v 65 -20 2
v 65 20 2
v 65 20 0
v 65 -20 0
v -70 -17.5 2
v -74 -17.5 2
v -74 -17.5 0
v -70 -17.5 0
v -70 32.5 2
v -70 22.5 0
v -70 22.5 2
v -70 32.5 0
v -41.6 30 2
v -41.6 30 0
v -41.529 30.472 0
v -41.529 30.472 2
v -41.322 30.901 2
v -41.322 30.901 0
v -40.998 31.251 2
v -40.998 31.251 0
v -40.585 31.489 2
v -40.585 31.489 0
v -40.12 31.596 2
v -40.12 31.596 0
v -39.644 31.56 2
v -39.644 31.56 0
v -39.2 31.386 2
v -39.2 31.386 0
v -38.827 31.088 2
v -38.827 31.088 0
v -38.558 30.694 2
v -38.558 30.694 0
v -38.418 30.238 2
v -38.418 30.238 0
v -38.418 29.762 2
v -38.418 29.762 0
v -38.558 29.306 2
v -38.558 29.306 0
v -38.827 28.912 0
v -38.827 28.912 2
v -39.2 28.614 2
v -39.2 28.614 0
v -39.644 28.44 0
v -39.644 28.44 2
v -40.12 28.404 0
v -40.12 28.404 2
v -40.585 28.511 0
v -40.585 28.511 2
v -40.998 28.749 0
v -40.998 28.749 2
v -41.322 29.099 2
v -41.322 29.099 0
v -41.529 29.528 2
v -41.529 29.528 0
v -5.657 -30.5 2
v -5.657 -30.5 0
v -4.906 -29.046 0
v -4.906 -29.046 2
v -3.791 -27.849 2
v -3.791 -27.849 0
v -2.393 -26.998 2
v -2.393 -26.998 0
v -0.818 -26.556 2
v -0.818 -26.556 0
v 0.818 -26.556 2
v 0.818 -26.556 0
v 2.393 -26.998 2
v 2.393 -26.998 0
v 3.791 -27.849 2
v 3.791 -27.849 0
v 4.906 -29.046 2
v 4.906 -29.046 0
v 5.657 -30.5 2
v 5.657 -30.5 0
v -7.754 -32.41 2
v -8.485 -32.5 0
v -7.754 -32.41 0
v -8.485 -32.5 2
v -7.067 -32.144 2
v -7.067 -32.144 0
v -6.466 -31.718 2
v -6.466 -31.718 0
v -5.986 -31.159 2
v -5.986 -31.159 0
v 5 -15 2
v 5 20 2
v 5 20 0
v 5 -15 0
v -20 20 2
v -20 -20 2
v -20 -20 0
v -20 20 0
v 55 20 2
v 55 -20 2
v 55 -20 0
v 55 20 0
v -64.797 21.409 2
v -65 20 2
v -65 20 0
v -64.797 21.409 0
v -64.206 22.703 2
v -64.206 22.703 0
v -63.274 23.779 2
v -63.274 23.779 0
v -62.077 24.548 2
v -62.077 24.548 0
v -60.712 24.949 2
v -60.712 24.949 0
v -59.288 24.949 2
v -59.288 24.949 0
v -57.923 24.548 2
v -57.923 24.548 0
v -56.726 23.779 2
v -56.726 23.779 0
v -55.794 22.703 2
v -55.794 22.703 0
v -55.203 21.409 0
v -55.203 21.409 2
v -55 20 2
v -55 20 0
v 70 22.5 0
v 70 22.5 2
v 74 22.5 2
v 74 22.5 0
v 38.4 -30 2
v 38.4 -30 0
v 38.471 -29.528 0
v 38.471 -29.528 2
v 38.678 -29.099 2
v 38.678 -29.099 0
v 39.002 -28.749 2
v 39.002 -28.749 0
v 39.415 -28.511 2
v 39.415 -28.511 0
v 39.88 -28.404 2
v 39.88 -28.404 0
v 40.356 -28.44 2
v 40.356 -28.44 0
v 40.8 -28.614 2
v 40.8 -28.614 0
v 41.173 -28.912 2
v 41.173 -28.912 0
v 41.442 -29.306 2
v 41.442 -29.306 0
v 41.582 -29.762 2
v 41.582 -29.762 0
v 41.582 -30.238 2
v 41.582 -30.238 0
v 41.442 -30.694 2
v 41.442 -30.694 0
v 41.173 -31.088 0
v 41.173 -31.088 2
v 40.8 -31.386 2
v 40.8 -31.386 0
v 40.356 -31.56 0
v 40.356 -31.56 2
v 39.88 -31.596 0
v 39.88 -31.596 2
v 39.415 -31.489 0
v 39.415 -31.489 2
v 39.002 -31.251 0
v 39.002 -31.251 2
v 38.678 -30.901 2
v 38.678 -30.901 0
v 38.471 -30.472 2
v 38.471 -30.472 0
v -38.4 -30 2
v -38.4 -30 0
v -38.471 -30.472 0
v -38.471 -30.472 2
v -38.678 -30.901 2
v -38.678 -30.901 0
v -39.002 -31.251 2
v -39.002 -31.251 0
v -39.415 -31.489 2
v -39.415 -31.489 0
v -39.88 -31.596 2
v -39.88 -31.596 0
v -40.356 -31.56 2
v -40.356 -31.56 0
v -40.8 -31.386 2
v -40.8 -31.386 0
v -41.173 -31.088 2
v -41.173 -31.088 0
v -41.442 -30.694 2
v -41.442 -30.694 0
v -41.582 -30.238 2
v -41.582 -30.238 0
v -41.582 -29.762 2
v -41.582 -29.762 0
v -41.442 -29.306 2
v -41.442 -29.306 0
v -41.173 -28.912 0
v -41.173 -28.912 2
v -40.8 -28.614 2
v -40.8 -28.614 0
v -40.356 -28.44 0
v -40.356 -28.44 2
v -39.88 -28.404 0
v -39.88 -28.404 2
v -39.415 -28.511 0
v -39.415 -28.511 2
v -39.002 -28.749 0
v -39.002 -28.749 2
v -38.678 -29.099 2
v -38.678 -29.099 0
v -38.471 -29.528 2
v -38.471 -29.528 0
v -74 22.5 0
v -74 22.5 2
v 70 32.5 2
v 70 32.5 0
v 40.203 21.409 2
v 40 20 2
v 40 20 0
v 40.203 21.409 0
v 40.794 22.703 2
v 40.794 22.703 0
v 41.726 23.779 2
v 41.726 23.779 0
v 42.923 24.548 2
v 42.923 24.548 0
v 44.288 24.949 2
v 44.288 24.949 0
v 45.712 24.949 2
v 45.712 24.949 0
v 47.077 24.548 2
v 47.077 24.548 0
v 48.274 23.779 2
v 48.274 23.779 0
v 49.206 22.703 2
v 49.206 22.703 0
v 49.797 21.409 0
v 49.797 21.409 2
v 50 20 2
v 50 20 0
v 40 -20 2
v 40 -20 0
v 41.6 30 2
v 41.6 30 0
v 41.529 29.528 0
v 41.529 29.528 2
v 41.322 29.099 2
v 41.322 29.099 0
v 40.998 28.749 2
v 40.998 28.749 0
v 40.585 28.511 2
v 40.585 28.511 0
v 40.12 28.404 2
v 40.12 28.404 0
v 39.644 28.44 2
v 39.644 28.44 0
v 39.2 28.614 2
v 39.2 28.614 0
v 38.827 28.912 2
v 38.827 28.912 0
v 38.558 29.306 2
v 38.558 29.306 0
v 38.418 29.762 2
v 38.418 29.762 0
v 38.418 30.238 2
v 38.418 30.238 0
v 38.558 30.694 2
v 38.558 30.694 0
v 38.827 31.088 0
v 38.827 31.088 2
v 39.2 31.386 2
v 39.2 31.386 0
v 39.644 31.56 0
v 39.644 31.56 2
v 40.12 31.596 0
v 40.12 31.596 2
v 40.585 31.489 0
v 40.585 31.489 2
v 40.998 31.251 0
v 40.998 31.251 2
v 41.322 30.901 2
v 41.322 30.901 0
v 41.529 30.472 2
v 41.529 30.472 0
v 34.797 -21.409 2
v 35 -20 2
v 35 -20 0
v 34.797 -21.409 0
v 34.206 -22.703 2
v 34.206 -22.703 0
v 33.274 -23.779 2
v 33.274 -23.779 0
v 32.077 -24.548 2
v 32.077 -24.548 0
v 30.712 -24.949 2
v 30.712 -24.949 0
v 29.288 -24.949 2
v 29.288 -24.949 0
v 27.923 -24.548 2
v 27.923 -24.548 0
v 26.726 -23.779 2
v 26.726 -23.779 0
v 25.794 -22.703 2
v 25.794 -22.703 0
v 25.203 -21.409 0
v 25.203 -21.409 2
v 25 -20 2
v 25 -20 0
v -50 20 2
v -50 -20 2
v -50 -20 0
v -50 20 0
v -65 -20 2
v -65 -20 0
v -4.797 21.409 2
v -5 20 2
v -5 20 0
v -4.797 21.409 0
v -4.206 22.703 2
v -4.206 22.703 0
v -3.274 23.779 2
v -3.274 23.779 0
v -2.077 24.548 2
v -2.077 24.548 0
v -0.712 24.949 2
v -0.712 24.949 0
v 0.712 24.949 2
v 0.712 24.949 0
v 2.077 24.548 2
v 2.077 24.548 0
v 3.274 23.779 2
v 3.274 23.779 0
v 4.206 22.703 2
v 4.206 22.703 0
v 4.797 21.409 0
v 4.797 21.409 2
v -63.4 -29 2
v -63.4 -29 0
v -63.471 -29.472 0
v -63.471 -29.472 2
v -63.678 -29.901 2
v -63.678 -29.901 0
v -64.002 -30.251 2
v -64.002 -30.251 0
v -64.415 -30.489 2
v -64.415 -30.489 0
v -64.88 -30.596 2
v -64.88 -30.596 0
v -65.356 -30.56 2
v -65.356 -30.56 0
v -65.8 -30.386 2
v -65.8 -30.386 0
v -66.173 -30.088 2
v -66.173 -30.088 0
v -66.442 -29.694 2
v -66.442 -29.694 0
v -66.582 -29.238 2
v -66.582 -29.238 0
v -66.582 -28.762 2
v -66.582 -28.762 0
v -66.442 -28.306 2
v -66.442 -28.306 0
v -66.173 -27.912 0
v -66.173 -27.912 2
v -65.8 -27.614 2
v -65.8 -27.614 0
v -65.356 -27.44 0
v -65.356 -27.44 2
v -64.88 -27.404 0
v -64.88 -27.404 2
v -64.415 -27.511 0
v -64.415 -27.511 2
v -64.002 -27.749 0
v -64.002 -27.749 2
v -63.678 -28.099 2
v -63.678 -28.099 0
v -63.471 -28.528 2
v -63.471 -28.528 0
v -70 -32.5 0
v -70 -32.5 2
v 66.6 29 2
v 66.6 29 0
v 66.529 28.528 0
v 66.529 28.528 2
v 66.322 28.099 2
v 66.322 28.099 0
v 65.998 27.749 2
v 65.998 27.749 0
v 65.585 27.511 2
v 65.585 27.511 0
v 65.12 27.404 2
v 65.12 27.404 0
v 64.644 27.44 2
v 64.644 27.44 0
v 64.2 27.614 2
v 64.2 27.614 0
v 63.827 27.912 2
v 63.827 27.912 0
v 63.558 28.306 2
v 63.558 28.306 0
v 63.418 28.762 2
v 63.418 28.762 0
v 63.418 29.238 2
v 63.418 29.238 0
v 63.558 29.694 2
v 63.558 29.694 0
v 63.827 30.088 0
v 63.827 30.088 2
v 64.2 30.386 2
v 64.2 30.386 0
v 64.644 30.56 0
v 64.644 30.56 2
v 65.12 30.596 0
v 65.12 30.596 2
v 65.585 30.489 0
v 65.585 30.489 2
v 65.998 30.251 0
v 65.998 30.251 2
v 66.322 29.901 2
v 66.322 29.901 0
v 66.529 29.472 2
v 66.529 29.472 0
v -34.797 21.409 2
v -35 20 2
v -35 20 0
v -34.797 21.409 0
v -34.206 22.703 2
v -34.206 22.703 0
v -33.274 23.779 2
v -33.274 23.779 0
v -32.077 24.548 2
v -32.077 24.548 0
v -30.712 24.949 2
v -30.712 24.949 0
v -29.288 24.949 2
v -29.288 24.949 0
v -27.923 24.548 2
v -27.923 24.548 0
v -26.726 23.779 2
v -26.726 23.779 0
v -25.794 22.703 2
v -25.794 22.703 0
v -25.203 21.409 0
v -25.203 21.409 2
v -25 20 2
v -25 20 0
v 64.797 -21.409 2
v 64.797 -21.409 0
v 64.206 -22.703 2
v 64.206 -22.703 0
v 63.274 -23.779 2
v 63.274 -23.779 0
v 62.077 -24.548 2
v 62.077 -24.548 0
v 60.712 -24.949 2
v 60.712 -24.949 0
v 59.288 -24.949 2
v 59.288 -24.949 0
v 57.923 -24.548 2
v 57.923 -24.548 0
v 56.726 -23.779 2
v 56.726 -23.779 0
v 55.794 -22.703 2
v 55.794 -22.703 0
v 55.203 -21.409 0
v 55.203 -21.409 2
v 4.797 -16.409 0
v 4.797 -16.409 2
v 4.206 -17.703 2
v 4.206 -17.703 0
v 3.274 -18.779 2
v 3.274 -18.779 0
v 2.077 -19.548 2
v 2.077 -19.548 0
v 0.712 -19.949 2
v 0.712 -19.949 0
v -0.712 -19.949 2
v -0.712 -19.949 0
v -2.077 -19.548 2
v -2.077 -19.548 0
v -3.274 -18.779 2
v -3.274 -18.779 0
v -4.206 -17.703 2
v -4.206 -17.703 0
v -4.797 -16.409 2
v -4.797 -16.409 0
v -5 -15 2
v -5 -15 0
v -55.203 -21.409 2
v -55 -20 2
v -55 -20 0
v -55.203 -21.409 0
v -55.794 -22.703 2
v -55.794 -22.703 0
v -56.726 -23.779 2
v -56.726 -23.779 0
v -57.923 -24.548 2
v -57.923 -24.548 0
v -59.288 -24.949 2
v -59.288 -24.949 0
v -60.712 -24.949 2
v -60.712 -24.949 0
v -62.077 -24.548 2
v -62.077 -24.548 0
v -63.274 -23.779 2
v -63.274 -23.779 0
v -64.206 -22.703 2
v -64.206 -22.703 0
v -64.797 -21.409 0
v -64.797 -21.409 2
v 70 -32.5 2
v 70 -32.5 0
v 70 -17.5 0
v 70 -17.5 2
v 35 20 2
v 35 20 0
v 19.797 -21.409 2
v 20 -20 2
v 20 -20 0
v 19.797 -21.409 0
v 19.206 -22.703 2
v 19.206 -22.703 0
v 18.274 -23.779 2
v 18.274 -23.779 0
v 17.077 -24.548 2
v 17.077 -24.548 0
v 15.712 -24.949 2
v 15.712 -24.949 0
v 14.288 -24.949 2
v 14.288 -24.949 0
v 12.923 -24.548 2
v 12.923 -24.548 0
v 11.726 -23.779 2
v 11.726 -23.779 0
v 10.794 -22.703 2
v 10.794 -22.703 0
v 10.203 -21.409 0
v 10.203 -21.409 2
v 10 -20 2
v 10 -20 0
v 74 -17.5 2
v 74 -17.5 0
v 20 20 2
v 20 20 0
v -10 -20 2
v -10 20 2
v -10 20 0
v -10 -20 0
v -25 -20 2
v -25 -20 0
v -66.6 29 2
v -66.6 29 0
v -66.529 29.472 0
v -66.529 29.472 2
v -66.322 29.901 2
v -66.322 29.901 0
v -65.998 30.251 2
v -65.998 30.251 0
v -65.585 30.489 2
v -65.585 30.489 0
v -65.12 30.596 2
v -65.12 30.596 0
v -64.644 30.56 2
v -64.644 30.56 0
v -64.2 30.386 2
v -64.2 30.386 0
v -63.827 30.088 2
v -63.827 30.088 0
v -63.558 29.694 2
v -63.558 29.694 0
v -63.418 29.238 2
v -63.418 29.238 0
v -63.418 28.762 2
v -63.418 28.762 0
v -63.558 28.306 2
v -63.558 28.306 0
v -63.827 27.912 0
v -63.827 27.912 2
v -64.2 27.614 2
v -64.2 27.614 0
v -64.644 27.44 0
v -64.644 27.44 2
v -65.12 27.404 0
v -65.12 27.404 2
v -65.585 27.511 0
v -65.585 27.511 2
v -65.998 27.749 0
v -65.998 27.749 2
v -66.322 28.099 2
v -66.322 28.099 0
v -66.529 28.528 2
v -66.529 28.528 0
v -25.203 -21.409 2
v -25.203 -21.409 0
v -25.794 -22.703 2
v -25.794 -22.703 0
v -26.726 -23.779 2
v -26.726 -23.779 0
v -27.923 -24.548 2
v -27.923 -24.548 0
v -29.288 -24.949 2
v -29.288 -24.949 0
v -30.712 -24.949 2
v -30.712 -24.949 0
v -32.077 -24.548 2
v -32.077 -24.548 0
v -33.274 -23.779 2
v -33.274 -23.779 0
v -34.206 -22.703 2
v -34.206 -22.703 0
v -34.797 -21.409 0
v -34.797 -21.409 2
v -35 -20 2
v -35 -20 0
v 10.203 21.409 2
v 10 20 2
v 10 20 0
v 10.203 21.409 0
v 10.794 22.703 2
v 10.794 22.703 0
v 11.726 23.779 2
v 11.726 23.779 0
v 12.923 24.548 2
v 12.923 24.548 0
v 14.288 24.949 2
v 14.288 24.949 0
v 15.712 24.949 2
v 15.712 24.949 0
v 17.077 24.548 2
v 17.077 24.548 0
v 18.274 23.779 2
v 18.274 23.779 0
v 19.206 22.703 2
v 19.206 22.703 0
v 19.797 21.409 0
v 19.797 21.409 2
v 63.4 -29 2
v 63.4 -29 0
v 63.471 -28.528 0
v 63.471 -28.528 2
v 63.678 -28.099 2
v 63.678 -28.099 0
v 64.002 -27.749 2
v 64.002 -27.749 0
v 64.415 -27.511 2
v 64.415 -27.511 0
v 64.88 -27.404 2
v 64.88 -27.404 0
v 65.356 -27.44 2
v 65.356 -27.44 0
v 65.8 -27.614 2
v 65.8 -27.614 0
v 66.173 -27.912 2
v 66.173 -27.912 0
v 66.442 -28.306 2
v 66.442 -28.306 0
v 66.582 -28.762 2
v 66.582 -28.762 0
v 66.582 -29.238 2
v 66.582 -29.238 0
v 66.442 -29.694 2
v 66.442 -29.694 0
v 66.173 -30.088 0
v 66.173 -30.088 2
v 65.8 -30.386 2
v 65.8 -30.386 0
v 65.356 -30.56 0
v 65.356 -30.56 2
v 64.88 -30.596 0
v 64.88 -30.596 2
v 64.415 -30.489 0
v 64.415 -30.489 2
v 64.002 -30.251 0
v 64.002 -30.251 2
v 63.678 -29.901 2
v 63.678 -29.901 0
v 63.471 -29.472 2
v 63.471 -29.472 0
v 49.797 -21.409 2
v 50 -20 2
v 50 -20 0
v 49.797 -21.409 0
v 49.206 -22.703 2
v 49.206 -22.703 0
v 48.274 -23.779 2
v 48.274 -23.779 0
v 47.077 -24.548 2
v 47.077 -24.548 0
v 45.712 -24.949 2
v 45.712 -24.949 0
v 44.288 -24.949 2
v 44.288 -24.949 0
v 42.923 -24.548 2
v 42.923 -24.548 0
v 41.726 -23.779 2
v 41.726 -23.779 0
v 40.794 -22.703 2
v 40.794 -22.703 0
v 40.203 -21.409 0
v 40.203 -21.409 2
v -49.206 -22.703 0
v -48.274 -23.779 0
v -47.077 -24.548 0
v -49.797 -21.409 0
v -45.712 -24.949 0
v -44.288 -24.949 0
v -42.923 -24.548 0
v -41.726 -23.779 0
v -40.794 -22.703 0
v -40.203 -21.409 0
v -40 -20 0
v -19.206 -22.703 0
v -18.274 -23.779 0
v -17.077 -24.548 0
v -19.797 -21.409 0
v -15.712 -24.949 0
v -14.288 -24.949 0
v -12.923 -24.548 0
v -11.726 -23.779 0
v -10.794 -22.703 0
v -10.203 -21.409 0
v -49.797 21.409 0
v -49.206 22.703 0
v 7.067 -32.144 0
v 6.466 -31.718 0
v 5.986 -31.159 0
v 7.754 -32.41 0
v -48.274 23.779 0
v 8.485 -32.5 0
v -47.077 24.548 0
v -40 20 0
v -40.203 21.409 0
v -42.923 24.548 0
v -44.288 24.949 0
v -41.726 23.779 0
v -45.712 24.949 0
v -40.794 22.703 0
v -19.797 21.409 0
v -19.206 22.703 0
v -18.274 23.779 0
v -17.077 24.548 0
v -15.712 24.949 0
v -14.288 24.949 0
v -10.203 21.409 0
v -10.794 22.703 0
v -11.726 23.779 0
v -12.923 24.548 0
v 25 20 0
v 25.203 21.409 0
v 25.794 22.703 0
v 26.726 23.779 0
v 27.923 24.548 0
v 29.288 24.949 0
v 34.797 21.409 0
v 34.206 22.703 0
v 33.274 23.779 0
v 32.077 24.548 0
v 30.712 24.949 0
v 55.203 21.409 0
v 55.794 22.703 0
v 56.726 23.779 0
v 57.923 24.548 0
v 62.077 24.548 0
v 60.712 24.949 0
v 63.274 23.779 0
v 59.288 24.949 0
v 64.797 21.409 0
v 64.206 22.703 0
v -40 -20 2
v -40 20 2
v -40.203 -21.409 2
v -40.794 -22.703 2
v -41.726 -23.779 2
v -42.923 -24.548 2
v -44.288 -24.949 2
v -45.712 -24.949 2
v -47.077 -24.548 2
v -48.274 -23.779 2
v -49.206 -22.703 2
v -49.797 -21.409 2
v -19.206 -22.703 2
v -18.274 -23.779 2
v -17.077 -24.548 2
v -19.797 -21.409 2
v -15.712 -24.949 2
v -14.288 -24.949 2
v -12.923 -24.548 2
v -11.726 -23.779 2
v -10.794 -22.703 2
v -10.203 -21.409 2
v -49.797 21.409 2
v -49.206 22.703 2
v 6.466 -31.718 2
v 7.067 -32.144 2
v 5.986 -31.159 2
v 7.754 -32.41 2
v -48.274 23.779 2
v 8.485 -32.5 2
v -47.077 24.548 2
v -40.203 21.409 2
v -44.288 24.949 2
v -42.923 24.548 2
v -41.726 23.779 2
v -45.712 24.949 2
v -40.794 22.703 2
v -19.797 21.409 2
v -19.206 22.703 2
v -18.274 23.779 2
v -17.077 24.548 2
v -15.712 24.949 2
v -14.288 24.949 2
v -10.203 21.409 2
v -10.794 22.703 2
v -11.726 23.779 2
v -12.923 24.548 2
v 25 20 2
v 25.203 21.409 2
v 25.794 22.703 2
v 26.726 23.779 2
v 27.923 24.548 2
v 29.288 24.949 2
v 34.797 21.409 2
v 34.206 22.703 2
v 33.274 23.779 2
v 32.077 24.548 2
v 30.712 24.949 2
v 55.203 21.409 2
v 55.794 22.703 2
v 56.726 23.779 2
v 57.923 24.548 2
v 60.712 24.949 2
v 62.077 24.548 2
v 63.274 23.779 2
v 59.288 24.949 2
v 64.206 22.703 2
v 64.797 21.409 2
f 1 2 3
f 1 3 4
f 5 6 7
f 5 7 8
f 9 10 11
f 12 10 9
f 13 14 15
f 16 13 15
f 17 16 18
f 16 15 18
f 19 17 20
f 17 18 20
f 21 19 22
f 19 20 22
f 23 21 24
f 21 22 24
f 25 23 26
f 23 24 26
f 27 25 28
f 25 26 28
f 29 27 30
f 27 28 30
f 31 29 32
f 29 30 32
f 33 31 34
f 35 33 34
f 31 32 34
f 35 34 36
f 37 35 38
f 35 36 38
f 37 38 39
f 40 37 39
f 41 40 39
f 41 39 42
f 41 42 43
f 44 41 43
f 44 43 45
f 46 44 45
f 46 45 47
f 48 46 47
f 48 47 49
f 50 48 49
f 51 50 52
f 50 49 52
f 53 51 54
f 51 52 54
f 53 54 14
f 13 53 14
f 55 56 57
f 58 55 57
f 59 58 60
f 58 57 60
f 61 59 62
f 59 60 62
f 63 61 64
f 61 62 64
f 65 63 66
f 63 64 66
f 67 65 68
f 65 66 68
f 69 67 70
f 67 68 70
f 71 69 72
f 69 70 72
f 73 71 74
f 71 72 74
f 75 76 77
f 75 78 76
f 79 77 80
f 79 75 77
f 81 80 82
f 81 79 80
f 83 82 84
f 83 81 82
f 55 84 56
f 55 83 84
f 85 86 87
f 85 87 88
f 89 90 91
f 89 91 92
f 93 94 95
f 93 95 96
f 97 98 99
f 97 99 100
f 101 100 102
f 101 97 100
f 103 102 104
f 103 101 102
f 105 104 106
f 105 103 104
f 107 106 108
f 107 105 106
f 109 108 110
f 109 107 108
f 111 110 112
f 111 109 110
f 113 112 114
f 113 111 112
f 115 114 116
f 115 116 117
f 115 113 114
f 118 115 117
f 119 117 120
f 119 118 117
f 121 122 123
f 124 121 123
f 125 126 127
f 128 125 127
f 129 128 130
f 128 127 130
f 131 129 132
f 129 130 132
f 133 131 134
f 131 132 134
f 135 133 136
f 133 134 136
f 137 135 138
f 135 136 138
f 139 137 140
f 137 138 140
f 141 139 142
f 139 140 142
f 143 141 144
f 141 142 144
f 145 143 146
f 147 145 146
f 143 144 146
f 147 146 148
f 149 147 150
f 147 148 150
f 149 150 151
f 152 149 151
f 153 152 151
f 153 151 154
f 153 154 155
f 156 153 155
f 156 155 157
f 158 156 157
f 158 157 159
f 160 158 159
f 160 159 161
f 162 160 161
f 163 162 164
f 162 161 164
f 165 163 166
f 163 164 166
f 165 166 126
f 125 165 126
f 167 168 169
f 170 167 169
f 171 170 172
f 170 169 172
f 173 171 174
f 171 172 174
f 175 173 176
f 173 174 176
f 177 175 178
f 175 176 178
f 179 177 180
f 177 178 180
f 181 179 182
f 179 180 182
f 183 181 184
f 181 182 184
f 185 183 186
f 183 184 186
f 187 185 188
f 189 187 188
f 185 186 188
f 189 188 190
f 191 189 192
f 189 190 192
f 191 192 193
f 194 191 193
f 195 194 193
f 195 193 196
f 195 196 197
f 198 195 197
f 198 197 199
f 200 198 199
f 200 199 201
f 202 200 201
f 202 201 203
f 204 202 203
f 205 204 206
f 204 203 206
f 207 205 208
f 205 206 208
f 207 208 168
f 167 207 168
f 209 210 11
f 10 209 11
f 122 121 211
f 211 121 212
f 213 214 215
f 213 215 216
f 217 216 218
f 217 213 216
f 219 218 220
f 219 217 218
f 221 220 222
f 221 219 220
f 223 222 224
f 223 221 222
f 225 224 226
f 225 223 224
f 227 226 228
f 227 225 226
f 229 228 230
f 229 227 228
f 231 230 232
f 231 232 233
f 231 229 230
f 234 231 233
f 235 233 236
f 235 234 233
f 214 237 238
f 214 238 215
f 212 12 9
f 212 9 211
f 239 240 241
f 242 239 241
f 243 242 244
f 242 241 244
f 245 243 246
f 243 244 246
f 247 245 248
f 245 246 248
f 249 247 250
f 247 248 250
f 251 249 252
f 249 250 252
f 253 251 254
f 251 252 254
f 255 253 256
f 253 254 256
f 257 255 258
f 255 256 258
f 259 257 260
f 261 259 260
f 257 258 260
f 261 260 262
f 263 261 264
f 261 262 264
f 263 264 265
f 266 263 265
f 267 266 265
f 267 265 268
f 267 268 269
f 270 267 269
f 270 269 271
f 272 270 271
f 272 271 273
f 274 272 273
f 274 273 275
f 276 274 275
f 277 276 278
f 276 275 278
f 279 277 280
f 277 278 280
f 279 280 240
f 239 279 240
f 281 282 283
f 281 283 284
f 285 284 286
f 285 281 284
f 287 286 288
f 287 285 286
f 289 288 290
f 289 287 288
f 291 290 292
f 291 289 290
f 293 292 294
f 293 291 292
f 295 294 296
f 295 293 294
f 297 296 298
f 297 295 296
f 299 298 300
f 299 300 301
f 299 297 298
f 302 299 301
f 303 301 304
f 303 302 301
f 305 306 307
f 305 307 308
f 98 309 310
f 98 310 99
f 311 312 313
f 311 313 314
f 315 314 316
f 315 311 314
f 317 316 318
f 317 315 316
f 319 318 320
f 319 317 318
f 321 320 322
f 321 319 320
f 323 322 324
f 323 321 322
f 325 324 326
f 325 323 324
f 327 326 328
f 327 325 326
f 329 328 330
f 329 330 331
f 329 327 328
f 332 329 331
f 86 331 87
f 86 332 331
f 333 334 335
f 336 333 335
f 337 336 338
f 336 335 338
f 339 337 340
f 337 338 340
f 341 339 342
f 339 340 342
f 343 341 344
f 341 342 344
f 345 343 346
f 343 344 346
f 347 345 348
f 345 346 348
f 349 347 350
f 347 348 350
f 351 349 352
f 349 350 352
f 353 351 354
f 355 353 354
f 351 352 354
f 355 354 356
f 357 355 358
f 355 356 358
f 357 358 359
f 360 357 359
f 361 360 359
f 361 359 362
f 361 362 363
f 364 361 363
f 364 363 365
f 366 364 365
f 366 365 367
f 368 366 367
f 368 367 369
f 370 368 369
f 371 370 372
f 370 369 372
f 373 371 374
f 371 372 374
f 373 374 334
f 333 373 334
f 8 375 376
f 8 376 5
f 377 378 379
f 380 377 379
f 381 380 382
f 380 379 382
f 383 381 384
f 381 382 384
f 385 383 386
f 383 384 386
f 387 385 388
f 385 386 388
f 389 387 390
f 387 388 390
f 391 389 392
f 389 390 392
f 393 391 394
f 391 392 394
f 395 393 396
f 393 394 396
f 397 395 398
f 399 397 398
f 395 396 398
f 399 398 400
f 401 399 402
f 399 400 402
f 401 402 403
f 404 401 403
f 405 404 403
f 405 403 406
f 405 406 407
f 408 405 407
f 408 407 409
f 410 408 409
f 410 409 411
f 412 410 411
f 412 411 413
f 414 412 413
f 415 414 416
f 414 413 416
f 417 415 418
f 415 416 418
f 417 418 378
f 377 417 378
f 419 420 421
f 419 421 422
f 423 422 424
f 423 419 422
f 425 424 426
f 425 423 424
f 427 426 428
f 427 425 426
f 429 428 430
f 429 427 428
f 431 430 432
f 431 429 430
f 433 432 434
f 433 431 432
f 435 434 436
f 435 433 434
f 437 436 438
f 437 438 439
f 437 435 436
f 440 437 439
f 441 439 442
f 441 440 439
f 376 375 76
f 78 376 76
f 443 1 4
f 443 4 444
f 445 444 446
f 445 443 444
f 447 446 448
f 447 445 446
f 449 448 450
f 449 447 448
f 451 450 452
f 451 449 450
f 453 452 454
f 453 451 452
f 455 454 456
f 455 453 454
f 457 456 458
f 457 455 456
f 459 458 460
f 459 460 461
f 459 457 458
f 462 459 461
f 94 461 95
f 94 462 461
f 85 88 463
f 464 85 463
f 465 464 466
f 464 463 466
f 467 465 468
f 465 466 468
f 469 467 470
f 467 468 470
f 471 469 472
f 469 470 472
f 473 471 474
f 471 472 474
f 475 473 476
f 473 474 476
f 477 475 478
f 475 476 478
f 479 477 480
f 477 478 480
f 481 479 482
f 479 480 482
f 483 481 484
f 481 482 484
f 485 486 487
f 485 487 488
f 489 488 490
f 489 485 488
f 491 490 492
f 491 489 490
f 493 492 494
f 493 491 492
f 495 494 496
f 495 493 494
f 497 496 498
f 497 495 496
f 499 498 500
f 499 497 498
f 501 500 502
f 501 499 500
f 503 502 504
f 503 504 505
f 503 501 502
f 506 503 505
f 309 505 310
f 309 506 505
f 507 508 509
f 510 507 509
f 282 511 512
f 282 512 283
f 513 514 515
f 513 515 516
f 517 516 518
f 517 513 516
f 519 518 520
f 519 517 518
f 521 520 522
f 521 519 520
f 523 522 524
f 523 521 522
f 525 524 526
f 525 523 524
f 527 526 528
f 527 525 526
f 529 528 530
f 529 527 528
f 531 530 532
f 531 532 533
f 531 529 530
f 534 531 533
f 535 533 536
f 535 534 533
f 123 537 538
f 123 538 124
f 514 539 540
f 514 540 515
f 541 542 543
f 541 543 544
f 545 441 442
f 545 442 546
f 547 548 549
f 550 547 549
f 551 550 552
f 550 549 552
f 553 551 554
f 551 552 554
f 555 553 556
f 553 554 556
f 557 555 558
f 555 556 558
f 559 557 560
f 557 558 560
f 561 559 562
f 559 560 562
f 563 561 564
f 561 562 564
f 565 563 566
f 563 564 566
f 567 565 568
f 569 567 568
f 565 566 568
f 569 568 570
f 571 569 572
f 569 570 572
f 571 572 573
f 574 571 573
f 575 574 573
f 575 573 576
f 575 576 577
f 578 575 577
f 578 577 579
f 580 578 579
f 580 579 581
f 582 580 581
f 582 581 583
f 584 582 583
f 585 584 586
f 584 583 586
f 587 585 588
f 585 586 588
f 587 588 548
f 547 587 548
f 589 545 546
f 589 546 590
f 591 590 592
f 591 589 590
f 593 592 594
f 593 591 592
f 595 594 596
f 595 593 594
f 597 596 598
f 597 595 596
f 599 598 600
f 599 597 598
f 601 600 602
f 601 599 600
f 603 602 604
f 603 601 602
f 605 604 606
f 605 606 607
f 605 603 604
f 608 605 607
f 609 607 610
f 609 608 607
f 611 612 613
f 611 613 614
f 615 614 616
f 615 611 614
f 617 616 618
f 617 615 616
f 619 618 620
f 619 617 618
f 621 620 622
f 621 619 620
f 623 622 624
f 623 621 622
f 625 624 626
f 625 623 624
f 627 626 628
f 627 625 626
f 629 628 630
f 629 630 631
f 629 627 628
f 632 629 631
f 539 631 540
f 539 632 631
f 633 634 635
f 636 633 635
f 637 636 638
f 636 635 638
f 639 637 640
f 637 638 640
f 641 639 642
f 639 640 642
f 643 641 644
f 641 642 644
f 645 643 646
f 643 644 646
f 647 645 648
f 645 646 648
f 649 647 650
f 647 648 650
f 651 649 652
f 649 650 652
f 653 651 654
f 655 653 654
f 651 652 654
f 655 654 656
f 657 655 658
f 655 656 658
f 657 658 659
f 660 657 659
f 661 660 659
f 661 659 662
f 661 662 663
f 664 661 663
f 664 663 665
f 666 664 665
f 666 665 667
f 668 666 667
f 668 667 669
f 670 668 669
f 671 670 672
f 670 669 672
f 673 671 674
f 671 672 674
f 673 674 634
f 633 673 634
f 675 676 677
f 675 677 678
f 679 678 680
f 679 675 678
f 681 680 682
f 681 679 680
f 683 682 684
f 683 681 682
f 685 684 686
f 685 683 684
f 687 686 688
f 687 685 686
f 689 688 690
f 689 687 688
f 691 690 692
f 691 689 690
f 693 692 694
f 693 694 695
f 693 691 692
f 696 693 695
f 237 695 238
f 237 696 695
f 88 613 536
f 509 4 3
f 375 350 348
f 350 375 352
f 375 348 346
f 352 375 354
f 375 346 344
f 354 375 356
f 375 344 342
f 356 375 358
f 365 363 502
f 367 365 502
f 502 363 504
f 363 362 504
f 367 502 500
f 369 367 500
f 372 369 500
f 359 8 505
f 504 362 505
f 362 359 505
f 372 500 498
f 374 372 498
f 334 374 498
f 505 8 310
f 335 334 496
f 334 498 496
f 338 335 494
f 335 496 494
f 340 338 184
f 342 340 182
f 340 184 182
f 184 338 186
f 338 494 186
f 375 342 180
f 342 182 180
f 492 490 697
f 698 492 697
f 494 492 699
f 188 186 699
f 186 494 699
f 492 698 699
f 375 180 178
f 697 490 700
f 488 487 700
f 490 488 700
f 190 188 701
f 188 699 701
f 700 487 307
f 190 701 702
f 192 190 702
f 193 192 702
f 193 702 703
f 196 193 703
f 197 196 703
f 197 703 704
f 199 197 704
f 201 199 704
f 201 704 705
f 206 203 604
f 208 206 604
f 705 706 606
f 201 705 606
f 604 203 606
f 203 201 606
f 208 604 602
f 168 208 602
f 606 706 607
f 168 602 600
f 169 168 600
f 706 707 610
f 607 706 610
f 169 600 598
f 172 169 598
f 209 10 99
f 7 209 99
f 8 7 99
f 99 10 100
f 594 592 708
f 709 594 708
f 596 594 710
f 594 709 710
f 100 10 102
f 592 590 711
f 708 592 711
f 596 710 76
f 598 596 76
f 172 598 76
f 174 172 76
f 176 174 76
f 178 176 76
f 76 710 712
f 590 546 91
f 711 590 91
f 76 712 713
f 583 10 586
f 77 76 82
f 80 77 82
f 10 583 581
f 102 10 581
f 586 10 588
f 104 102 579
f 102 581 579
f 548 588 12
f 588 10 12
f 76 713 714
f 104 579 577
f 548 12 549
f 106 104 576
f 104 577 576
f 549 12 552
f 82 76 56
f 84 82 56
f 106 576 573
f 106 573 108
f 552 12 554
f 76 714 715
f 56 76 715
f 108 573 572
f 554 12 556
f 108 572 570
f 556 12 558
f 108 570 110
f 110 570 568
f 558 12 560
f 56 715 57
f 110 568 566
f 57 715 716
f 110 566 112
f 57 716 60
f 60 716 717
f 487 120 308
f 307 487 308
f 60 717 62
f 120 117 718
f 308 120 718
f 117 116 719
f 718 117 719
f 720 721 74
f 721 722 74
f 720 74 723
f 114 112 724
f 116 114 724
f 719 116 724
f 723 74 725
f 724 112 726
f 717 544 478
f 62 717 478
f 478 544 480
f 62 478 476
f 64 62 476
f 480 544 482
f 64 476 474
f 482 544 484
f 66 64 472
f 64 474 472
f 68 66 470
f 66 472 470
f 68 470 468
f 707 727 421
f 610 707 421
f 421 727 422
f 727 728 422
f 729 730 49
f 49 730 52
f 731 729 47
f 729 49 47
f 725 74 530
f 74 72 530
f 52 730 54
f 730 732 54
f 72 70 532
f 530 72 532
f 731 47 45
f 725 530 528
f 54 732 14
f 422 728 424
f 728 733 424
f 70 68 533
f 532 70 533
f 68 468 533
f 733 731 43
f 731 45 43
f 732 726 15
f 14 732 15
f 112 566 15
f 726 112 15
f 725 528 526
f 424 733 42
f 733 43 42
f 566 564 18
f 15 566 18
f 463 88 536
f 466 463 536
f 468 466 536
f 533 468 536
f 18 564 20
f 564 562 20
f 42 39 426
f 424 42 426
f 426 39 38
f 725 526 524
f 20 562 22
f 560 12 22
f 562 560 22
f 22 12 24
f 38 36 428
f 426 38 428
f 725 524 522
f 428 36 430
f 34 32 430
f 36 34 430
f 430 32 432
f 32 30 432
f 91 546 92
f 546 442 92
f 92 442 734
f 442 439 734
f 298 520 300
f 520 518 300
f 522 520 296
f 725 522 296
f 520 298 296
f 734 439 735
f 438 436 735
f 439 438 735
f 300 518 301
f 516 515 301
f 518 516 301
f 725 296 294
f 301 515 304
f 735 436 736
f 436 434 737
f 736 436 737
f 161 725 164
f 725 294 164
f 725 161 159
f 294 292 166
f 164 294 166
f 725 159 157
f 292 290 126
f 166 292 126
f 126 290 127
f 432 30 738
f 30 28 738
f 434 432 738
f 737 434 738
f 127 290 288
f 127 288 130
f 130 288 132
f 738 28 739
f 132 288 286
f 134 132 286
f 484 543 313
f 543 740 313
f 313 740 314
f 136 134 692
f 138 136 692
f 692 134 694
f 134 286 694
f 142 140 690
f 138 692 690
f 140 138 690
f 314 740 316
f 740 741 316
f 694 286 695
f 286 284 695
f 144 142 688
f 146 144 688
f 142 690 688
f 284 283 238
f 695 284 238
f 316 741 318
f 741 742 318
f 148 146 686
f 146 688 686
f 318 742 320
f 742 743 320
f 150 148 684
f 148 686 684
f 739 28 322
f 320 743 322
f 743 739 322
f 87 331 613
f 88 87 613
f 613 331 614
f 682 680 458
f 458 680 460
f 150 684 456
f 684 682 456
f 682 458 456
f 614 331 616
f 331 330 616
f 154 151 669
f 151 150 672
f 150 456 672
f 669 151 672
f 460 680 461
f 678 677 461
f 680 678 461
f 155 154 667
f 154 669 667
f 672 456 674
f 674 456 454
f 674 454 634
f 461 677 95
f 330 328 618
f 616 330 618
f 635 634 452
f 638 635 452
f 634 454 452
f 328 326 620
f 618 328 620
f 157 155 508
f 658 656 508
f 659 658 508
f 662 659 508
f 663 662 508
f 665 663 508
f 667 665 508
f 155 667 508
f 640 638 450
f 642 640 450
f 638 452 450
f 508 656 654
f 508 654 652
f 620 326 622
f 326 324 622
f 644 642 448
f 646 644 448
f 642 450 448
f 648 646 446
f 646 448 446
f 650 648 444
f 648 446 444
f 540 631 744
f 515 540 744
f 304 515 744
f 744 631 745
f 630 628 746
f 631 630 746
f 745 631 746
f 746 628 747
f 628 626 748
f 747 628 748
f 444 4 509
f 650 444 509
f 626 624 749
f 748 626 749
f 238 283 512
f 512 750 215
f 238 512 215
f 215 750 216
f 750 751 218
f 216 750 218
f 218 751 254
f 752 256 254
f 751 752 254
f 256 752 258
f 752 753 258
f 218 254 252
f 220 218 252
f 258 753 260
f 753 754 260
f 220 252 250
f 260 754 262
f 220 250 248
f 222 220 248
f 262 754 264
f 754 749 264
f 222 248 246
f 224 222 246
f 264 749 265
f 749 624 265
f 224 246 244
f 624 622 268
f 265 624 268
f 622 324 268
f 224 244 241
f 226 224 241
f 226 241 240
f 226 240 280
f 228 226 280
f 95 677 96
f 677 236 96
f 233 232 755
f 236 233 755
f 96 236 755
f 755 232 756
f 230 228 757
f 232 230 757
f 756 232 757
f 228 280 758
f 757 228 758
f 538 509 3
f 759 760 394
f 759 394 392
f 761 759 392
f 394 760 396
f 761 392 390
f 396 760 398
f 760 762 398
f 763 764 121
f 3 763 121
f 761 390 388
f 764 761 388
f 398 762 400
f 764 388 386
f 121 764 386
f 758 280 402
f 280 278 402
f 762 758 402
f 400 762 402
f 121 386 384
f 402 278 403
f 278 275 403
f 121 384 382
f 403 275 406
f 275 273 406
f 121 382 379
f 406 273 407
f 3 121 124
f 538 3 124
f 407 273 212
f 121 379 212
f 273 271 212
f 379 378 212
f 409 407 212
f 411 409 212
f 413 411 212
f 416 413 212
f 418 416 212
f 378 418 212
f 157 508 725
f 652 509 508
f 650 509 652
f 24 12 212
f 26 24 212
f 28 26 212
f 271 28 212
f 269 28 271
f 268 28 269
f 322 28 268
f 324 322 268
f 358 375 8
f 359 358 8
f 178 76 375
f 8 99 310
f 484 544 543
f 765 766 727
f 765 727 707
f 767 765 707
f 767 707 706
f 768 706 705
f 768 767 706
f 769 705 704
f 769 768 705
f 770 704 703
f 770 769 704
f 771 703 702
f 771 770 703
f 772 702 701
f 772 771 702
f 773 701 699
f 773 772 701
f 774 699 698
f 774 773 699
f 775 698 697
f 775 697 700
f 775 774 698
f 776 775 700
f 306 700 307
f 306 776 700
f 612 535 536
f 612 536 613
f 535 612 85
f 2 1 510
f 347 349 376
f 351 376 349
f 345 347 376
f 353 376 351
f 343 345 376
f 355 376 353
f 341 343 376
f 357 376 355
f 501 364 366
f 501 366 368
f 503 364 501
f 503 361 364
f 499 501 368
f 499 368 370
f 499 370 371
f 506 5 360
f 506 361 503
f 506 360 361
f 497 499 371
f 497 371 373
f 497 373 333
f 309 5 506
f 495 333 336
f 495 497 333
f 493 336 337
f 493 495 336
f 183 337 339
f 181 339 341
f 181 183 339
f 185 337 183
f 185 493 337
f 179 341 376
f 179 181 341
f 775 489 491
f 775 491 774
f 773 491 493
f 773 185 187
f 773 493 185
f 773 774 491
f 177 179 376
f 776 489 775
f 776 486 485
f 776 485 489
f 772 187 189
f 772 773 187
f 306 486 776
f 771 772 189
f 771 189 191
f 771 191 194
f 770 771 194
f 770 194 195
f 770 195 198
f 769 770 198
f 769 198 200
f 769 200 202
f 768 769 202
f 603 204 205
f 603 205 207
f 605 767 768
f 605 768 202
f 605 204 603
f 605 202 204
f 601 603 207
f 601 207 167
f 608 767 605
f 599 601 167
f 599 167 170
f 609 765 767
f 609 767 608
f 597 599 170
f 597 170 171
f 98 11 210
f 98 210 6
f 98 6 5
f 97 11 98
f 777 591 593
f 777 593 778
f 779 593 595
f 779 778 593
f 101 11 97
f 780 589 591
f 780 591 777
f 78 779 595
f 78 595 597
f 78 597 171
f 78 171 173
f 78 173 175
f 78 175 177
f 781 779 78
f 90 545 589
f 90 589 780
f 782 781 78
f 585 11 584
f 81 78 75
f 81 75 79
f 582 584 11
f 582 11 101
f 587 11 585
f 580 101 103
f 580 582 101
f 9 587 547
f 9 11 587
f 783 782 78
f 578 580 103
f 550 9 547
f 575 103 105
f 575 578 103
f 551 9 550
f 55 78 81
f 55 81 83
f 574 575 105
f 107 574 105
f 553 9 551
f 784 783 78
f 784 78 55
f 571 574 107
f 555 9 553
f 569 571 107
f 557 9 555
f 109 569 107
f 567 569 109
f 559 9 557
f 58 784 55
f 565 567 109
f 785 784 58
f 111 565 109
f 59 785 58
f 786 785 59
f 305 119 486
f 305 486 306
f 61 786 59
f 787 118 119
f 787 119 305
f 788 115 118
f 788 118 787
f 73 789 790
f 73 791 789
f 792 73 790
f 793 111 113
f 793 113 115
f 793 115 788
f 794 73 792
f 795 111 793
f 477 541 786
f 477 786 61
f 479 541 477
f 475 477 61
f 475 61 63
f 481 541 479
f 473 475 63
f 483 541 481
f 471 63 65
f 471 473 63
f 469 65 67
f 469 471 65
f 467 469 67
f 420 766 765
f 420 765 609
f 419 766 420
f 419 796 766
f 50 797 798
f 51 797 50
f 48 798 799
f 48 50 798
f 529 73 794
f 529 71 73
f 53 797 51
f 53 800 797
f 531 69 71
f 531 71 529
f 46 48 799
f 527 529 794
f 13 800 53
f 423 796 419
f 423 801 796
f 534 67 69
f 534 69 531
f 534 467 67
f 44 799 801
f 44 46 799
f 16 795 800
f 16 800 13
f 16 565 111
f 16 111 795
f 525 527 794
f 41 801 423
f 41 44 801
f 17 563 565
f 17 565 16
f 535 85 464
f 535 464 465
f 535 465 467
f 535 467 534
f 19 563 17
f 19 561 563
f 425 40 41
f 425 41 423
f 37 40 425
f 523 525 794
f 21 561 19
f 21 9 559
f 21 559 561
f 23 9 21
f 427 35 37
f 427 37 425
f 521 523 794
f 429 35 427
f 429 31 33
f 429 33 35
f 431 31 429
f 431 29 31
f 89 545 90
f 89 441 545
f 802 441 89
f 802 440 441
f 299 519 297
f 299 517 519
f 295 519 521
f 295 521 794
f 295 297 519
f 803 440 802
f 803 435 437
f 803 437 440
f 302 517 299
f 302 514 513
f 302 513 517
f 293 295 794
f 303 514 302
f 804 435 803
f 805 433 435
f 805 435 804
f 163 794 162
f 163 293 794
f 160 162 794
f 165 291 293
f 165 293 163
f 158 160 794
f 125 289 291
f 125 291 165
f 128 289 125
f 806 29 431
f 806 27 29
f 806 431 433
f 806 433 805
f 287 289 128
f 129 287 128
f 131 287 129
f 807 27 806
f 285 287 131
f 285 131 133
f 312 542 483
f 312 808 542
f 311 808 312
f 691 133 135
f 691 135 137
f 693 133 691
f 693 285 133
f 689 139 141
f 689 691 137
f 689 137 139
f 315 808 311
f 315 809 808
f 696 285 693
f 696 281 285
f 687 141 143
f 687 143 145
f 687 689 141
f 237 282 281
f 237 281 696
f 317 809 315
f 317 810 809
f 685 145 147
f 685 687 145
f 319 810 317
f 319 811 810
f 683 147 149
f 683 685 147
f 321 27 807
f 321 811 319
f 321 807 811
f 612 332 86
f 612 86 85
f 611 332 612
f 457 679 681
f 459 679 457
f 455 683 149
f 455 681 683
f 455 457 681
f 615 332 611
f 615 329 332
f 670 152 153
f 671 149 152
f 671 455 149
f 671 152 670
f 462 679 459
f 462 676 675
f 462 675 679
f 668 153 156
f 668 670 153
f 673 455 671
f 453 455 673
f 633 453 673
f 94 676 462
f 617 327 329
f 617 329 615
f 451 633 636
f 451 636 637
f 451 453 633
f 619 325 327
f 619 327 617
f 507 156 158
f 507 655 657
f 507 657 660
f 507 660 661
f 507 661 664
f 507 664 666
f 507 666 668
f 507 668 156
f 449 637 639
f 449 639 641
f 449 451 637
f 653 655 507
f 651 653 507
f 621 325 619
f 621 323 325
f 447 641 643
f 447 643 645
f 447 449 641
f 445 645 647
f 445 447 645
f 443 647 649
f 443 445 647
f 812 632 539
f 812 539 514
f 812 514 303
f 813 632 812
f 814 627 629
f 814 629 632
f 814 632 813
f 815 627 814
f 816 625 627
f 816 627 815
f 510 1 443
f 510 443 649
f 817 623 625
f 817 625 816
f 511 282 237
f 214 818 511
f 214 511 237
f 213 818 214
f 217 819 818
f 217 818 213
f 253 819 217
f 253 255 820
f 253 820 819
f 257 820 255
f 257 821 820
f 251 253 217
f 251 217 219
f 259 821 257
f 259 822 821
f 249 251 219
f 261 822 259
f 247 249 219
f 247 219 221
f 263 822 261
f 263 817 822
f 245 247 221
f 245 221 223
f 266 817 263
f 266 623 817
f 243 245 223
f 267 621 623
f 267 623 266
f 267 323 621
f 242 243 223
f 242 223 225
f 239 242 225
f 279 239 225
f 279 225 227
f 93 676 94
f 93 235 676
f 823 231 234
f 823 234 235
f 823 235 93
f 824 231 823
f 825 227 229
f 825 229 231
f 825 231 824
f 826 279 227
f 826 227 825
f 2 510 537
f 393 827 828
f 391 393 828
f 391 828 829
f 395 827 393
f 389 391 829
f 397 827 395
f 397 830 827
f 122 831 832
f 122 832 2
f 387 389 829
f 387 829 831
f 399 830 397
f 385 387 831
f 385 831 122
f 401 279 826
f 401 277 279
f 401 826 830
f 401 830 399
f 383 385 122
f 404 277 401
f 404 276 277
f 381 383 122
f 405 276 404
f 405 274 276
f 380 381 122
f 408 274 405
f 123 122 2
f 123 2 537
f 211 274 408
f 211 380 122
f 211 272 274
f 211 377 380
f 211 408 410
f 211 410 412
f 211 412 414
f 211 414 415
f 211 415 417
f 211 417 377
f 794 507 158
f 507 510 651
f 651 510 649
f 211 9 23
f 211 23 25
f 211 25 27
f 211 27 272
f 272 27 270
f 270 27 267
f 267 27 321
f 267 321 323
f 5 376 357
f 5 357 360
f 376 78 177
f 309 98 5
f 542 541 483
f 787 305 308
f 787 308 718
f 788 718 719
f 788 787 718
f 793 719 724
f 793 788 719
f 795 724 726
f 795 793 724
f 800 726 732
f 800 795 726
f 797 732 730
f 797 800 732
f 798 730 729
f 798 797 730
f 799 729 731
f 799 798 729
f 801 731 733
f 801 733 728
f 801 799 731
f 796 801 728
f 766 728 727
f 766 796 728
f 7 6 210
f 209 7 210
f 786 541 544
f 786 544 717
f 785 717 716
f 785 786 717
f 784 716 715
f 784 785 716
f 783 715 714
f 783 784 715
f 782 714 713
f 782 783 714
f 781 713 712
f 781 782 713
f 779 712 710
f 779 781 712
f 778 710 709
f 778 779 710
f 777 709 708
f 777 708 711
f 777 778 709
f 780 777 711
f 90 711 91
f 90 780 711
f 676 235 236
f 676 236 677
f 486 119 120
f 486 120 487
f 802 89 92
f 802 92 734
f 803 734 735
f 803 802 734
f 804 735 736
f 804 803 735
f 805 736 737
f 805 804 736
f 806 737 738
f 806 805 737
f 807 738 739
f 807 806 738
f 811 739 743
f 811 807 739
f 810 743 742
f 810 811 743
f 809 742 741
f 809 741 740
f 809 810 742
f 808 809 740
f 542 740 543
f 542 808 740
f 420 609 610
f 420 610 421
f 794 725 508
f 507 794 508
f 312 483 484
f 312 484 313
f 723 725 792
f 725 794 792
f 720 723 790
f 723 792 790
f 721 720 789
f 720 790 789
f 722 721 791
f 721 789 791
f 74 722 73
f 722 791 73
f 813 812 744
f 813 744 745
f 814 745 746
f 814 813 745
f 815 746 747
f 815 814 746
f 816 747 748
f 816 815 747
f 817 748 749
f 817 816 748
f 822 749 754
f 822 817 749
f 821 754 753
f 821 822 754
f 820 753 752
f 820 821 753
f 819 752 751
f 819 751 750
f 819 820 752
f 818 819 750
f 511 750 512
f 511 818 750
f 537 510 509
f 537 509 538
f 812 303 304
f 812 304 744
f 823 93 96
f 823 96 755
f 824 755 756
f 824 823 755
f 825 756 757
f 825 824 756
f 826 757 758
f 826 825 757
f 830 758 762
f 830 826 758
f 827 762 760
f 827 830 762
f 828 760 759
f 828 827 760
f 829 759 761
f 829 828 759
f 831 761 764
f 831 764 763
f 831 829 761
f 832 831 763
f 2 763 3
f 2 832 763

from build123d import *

# Parameters (mm, degrees)
SKETCH_1_W          = 140
SKETCH_1_H          = 65
EXTRUDE_1_DEPTH     = 2
SKETCH_2_W          = 4
SKETCH_2_H          = 40
EXTRUDE_2_DEPTH     = 2
CUT_EXTRUDE_1_DEPTH = 2
SKETCH_4_R          = 1.6
CUT_EXTRUDE_2_DEPTH = 2
SKETCH_5_R          = 1.6
CUT_EXTRUDE_3_DEPTH = 2
CUT_EXTRUDE_4_DEPTH = 81.847077869
FILLET_1_R          = 3
EXTRUDE_3_DEPTH     = 2


with BuildPart() as part:
    # 草图1 → 凸台-拉伸1 (new body)
    with BuildSketch(Plane.XY):
        Rectangle(SKETCH_1_W, SKETCH_1_H)
    extrude(amount=EXTRUDE_1_DEPTH)

    # 草图2 → 凸台-拉伸2 (add)
    with BuildSketch(Plane.XY.offset(2)):
        with Locations((-72, 2.5)):
            Rectangle(SKETCH_2_W, SKETCH_2_H)
        with Locations((72, 2.5)):
            Rectangle(SKETCH_2_W, SKETCH_2_H)
    extrude(amount=-EXTRUDE_2_DEPTH)

    # 草图3 → 切除-拉伸1 (cut)
    with BuildSketch(Plane.XY.offset(2)):
        with BuildLine():
            Line((-65, -20), (-65, 20))
            ThreePointArc((-65, 20), (-60, 25), (-55, 20))
            Line((-55, 20), (-55, -20))
            ThreePointArc((-55, -20), (-60, -25), (-65, -20))
        make_face()
        with BuildLine():
            Line((-50, -20), (-50, 20))
            ThreePointArc((-50, 20), (-45, 25), (-40, 20))
            Line((-40, 20), (-40, -20))
            ThreePointArc((-40, -20), (-45, -25), (-50, -20))
        make_face()
        with BuildLine():
            Line((-35, -20), (-35, 20))
            ThreePointArc((-35, 20), (-30, 25), (-25, 20))
            Line((-25, 20), (-25, -20))
            ThreePointArc((-25, -20), (-30, -25), (-35, -20))
        make_face()
        with BuildLine():
            Line((-20, -20), (-20, 20))
            ThreePointArc((-20, 20), (-15, 25), (-10, 20))
            Line((-10, 20), (-10, -20))
            ThreePointArc((-10, -20), (-15, -25), (-20, -20))
        make_face()
        with BuildLine():
            Line((-5, -20), (-5, 20))
            ThreePointArc((-5, 20), (0, 25), (5, 20))
            Line((5, 20), (5, -20))
            ThreePointArc((5, -20), (0, -25), (-5, -20))
        make_face()
        with BuildLine():
            Line((10, -20), (10, 20))
            ThreePointArc((10, 20), (15, 25), (20, 20))
            Line((20, 20), (20, -20))
            ThreePointArc((20, -20), (15, -25), (10, -20))
        make_face()
        with BuildLine():
            Line((25, -20), (25, 20))
            ThreePointArc((25, 20), (30, 25), (35, 20))
            Line((35, 20), (35, -20))
            ThreePointArc((35, -20), (30, -25), (25, -20))
        make_face()
        with BuildLine():
            Line((40, -20), (40, 20))
            ThreePointArc((40, 20), (45, 25), (50, 20))
            Line((50, 20), (50, -20))
            ThreePointArc((50, -20), (45, -25), (40, -20))
        make_face()
        with BuildLine():
            Line((55, -20), (55, 20))
            ThreePointArc((55, 20), (60, 25), (65, 20))
            Line((65, 20), (65, -20))
            ThreePointArc((65, -20), (60, -25), (55, -20))
        make_face()
    extrude(amount=-CUT_EXTRUDE_1_DEPTH, mode=Mode.SUBTRACT)

    # 草图4 → 切除-拉伸2 (cut)
    with BuildSketch(Plane(origin=(0, 0, 0), x_dir=(-1, 0, 0), z_dir=(0, 0, -1))):
        with Locations((-40, -30)):
            Circle(SKETCH_4_R)
        with Locations(Location((40, -30, 0), (0, 0, 180))):
            Circle(SKETCH_4_R)
        with Locations((40, 30)):
            Circle(SKETCH_4_R)
        with Locations(Location((-40, 30, 0), (0, 0, 180))):
            Circle(SKETCH_4_R)
    extrude(amount=-CUT_EXTRUDE_2_DEPTH, mode=Mode.SUBTRACT)

    # 草图5 → 切除-拉伸3 (cut)
    with BuildSketch(Plane(origin=(0, 0, 0), x_dir=(-1, 0, 0), z_dir=(0, 0, -1))):
        with Locations((-65, -29)):
            Circle(SKETCH_5_R)
        with Locations(Location((-65, 29, 0), (0, 0, 180))):
            Circle(SKETCH_5_R)
        with Locations(Location((65, -29, 0), (0, 0, 180))):
            Circle(SKETCH_5_R)
        with Locations((65, 29)):
            Circle(SKETCH_5_R)
    extrude(amount=-CUT_EXTRUDE_3_DEPTH, mode=Mode.SUBTRACT)

    # 草图6 → 切除-拉伸4 (cut, through all)
    with BuildSketch(Plane(origin=(0, 0, 0), x_dir=(-1, 0, 0), z_dir=(0, 0, -1))):
        with BuildLine():
            Line((-6, -32.5), (6, -32.5))
            ThreePointArc((6, -32.5), (0, -26.5), (-6, -32.5))
        make_face()
    extrude(amount=-CUT_EXTRUDE_4_DEPTH, mode=Mode.SUBTRACT)

    # 圆角1
    fillet_1_edges = [part.edges().sort_by_distance(p)[0] for p in [
        (6, -32.5, 1),
        (-6, -32.5, 1),
    ]]
    fillet(fillet_1_edges, radius=FILLET_1_R)

    # 草图7 → 凸台-拉伸3 (add, through all)
    with BuildSketch(Plane(origin=(0, 0, 0), x_dir=(-1, 0, 0), z_dir=(0, 0, -1))):
        with BuildLine():
            Line((5, -15), (5, -20))
            ThreePointArc((5, -20), (0, -25), (-5, -20))
            Line((-5, -20), (-5, -15))
            ThreePointArc((-5, -15), (0, -20), (5, -15))
        make_face()
    extrude(amount=-EXTRUDE_3_DEPTH)


solid = part.part
